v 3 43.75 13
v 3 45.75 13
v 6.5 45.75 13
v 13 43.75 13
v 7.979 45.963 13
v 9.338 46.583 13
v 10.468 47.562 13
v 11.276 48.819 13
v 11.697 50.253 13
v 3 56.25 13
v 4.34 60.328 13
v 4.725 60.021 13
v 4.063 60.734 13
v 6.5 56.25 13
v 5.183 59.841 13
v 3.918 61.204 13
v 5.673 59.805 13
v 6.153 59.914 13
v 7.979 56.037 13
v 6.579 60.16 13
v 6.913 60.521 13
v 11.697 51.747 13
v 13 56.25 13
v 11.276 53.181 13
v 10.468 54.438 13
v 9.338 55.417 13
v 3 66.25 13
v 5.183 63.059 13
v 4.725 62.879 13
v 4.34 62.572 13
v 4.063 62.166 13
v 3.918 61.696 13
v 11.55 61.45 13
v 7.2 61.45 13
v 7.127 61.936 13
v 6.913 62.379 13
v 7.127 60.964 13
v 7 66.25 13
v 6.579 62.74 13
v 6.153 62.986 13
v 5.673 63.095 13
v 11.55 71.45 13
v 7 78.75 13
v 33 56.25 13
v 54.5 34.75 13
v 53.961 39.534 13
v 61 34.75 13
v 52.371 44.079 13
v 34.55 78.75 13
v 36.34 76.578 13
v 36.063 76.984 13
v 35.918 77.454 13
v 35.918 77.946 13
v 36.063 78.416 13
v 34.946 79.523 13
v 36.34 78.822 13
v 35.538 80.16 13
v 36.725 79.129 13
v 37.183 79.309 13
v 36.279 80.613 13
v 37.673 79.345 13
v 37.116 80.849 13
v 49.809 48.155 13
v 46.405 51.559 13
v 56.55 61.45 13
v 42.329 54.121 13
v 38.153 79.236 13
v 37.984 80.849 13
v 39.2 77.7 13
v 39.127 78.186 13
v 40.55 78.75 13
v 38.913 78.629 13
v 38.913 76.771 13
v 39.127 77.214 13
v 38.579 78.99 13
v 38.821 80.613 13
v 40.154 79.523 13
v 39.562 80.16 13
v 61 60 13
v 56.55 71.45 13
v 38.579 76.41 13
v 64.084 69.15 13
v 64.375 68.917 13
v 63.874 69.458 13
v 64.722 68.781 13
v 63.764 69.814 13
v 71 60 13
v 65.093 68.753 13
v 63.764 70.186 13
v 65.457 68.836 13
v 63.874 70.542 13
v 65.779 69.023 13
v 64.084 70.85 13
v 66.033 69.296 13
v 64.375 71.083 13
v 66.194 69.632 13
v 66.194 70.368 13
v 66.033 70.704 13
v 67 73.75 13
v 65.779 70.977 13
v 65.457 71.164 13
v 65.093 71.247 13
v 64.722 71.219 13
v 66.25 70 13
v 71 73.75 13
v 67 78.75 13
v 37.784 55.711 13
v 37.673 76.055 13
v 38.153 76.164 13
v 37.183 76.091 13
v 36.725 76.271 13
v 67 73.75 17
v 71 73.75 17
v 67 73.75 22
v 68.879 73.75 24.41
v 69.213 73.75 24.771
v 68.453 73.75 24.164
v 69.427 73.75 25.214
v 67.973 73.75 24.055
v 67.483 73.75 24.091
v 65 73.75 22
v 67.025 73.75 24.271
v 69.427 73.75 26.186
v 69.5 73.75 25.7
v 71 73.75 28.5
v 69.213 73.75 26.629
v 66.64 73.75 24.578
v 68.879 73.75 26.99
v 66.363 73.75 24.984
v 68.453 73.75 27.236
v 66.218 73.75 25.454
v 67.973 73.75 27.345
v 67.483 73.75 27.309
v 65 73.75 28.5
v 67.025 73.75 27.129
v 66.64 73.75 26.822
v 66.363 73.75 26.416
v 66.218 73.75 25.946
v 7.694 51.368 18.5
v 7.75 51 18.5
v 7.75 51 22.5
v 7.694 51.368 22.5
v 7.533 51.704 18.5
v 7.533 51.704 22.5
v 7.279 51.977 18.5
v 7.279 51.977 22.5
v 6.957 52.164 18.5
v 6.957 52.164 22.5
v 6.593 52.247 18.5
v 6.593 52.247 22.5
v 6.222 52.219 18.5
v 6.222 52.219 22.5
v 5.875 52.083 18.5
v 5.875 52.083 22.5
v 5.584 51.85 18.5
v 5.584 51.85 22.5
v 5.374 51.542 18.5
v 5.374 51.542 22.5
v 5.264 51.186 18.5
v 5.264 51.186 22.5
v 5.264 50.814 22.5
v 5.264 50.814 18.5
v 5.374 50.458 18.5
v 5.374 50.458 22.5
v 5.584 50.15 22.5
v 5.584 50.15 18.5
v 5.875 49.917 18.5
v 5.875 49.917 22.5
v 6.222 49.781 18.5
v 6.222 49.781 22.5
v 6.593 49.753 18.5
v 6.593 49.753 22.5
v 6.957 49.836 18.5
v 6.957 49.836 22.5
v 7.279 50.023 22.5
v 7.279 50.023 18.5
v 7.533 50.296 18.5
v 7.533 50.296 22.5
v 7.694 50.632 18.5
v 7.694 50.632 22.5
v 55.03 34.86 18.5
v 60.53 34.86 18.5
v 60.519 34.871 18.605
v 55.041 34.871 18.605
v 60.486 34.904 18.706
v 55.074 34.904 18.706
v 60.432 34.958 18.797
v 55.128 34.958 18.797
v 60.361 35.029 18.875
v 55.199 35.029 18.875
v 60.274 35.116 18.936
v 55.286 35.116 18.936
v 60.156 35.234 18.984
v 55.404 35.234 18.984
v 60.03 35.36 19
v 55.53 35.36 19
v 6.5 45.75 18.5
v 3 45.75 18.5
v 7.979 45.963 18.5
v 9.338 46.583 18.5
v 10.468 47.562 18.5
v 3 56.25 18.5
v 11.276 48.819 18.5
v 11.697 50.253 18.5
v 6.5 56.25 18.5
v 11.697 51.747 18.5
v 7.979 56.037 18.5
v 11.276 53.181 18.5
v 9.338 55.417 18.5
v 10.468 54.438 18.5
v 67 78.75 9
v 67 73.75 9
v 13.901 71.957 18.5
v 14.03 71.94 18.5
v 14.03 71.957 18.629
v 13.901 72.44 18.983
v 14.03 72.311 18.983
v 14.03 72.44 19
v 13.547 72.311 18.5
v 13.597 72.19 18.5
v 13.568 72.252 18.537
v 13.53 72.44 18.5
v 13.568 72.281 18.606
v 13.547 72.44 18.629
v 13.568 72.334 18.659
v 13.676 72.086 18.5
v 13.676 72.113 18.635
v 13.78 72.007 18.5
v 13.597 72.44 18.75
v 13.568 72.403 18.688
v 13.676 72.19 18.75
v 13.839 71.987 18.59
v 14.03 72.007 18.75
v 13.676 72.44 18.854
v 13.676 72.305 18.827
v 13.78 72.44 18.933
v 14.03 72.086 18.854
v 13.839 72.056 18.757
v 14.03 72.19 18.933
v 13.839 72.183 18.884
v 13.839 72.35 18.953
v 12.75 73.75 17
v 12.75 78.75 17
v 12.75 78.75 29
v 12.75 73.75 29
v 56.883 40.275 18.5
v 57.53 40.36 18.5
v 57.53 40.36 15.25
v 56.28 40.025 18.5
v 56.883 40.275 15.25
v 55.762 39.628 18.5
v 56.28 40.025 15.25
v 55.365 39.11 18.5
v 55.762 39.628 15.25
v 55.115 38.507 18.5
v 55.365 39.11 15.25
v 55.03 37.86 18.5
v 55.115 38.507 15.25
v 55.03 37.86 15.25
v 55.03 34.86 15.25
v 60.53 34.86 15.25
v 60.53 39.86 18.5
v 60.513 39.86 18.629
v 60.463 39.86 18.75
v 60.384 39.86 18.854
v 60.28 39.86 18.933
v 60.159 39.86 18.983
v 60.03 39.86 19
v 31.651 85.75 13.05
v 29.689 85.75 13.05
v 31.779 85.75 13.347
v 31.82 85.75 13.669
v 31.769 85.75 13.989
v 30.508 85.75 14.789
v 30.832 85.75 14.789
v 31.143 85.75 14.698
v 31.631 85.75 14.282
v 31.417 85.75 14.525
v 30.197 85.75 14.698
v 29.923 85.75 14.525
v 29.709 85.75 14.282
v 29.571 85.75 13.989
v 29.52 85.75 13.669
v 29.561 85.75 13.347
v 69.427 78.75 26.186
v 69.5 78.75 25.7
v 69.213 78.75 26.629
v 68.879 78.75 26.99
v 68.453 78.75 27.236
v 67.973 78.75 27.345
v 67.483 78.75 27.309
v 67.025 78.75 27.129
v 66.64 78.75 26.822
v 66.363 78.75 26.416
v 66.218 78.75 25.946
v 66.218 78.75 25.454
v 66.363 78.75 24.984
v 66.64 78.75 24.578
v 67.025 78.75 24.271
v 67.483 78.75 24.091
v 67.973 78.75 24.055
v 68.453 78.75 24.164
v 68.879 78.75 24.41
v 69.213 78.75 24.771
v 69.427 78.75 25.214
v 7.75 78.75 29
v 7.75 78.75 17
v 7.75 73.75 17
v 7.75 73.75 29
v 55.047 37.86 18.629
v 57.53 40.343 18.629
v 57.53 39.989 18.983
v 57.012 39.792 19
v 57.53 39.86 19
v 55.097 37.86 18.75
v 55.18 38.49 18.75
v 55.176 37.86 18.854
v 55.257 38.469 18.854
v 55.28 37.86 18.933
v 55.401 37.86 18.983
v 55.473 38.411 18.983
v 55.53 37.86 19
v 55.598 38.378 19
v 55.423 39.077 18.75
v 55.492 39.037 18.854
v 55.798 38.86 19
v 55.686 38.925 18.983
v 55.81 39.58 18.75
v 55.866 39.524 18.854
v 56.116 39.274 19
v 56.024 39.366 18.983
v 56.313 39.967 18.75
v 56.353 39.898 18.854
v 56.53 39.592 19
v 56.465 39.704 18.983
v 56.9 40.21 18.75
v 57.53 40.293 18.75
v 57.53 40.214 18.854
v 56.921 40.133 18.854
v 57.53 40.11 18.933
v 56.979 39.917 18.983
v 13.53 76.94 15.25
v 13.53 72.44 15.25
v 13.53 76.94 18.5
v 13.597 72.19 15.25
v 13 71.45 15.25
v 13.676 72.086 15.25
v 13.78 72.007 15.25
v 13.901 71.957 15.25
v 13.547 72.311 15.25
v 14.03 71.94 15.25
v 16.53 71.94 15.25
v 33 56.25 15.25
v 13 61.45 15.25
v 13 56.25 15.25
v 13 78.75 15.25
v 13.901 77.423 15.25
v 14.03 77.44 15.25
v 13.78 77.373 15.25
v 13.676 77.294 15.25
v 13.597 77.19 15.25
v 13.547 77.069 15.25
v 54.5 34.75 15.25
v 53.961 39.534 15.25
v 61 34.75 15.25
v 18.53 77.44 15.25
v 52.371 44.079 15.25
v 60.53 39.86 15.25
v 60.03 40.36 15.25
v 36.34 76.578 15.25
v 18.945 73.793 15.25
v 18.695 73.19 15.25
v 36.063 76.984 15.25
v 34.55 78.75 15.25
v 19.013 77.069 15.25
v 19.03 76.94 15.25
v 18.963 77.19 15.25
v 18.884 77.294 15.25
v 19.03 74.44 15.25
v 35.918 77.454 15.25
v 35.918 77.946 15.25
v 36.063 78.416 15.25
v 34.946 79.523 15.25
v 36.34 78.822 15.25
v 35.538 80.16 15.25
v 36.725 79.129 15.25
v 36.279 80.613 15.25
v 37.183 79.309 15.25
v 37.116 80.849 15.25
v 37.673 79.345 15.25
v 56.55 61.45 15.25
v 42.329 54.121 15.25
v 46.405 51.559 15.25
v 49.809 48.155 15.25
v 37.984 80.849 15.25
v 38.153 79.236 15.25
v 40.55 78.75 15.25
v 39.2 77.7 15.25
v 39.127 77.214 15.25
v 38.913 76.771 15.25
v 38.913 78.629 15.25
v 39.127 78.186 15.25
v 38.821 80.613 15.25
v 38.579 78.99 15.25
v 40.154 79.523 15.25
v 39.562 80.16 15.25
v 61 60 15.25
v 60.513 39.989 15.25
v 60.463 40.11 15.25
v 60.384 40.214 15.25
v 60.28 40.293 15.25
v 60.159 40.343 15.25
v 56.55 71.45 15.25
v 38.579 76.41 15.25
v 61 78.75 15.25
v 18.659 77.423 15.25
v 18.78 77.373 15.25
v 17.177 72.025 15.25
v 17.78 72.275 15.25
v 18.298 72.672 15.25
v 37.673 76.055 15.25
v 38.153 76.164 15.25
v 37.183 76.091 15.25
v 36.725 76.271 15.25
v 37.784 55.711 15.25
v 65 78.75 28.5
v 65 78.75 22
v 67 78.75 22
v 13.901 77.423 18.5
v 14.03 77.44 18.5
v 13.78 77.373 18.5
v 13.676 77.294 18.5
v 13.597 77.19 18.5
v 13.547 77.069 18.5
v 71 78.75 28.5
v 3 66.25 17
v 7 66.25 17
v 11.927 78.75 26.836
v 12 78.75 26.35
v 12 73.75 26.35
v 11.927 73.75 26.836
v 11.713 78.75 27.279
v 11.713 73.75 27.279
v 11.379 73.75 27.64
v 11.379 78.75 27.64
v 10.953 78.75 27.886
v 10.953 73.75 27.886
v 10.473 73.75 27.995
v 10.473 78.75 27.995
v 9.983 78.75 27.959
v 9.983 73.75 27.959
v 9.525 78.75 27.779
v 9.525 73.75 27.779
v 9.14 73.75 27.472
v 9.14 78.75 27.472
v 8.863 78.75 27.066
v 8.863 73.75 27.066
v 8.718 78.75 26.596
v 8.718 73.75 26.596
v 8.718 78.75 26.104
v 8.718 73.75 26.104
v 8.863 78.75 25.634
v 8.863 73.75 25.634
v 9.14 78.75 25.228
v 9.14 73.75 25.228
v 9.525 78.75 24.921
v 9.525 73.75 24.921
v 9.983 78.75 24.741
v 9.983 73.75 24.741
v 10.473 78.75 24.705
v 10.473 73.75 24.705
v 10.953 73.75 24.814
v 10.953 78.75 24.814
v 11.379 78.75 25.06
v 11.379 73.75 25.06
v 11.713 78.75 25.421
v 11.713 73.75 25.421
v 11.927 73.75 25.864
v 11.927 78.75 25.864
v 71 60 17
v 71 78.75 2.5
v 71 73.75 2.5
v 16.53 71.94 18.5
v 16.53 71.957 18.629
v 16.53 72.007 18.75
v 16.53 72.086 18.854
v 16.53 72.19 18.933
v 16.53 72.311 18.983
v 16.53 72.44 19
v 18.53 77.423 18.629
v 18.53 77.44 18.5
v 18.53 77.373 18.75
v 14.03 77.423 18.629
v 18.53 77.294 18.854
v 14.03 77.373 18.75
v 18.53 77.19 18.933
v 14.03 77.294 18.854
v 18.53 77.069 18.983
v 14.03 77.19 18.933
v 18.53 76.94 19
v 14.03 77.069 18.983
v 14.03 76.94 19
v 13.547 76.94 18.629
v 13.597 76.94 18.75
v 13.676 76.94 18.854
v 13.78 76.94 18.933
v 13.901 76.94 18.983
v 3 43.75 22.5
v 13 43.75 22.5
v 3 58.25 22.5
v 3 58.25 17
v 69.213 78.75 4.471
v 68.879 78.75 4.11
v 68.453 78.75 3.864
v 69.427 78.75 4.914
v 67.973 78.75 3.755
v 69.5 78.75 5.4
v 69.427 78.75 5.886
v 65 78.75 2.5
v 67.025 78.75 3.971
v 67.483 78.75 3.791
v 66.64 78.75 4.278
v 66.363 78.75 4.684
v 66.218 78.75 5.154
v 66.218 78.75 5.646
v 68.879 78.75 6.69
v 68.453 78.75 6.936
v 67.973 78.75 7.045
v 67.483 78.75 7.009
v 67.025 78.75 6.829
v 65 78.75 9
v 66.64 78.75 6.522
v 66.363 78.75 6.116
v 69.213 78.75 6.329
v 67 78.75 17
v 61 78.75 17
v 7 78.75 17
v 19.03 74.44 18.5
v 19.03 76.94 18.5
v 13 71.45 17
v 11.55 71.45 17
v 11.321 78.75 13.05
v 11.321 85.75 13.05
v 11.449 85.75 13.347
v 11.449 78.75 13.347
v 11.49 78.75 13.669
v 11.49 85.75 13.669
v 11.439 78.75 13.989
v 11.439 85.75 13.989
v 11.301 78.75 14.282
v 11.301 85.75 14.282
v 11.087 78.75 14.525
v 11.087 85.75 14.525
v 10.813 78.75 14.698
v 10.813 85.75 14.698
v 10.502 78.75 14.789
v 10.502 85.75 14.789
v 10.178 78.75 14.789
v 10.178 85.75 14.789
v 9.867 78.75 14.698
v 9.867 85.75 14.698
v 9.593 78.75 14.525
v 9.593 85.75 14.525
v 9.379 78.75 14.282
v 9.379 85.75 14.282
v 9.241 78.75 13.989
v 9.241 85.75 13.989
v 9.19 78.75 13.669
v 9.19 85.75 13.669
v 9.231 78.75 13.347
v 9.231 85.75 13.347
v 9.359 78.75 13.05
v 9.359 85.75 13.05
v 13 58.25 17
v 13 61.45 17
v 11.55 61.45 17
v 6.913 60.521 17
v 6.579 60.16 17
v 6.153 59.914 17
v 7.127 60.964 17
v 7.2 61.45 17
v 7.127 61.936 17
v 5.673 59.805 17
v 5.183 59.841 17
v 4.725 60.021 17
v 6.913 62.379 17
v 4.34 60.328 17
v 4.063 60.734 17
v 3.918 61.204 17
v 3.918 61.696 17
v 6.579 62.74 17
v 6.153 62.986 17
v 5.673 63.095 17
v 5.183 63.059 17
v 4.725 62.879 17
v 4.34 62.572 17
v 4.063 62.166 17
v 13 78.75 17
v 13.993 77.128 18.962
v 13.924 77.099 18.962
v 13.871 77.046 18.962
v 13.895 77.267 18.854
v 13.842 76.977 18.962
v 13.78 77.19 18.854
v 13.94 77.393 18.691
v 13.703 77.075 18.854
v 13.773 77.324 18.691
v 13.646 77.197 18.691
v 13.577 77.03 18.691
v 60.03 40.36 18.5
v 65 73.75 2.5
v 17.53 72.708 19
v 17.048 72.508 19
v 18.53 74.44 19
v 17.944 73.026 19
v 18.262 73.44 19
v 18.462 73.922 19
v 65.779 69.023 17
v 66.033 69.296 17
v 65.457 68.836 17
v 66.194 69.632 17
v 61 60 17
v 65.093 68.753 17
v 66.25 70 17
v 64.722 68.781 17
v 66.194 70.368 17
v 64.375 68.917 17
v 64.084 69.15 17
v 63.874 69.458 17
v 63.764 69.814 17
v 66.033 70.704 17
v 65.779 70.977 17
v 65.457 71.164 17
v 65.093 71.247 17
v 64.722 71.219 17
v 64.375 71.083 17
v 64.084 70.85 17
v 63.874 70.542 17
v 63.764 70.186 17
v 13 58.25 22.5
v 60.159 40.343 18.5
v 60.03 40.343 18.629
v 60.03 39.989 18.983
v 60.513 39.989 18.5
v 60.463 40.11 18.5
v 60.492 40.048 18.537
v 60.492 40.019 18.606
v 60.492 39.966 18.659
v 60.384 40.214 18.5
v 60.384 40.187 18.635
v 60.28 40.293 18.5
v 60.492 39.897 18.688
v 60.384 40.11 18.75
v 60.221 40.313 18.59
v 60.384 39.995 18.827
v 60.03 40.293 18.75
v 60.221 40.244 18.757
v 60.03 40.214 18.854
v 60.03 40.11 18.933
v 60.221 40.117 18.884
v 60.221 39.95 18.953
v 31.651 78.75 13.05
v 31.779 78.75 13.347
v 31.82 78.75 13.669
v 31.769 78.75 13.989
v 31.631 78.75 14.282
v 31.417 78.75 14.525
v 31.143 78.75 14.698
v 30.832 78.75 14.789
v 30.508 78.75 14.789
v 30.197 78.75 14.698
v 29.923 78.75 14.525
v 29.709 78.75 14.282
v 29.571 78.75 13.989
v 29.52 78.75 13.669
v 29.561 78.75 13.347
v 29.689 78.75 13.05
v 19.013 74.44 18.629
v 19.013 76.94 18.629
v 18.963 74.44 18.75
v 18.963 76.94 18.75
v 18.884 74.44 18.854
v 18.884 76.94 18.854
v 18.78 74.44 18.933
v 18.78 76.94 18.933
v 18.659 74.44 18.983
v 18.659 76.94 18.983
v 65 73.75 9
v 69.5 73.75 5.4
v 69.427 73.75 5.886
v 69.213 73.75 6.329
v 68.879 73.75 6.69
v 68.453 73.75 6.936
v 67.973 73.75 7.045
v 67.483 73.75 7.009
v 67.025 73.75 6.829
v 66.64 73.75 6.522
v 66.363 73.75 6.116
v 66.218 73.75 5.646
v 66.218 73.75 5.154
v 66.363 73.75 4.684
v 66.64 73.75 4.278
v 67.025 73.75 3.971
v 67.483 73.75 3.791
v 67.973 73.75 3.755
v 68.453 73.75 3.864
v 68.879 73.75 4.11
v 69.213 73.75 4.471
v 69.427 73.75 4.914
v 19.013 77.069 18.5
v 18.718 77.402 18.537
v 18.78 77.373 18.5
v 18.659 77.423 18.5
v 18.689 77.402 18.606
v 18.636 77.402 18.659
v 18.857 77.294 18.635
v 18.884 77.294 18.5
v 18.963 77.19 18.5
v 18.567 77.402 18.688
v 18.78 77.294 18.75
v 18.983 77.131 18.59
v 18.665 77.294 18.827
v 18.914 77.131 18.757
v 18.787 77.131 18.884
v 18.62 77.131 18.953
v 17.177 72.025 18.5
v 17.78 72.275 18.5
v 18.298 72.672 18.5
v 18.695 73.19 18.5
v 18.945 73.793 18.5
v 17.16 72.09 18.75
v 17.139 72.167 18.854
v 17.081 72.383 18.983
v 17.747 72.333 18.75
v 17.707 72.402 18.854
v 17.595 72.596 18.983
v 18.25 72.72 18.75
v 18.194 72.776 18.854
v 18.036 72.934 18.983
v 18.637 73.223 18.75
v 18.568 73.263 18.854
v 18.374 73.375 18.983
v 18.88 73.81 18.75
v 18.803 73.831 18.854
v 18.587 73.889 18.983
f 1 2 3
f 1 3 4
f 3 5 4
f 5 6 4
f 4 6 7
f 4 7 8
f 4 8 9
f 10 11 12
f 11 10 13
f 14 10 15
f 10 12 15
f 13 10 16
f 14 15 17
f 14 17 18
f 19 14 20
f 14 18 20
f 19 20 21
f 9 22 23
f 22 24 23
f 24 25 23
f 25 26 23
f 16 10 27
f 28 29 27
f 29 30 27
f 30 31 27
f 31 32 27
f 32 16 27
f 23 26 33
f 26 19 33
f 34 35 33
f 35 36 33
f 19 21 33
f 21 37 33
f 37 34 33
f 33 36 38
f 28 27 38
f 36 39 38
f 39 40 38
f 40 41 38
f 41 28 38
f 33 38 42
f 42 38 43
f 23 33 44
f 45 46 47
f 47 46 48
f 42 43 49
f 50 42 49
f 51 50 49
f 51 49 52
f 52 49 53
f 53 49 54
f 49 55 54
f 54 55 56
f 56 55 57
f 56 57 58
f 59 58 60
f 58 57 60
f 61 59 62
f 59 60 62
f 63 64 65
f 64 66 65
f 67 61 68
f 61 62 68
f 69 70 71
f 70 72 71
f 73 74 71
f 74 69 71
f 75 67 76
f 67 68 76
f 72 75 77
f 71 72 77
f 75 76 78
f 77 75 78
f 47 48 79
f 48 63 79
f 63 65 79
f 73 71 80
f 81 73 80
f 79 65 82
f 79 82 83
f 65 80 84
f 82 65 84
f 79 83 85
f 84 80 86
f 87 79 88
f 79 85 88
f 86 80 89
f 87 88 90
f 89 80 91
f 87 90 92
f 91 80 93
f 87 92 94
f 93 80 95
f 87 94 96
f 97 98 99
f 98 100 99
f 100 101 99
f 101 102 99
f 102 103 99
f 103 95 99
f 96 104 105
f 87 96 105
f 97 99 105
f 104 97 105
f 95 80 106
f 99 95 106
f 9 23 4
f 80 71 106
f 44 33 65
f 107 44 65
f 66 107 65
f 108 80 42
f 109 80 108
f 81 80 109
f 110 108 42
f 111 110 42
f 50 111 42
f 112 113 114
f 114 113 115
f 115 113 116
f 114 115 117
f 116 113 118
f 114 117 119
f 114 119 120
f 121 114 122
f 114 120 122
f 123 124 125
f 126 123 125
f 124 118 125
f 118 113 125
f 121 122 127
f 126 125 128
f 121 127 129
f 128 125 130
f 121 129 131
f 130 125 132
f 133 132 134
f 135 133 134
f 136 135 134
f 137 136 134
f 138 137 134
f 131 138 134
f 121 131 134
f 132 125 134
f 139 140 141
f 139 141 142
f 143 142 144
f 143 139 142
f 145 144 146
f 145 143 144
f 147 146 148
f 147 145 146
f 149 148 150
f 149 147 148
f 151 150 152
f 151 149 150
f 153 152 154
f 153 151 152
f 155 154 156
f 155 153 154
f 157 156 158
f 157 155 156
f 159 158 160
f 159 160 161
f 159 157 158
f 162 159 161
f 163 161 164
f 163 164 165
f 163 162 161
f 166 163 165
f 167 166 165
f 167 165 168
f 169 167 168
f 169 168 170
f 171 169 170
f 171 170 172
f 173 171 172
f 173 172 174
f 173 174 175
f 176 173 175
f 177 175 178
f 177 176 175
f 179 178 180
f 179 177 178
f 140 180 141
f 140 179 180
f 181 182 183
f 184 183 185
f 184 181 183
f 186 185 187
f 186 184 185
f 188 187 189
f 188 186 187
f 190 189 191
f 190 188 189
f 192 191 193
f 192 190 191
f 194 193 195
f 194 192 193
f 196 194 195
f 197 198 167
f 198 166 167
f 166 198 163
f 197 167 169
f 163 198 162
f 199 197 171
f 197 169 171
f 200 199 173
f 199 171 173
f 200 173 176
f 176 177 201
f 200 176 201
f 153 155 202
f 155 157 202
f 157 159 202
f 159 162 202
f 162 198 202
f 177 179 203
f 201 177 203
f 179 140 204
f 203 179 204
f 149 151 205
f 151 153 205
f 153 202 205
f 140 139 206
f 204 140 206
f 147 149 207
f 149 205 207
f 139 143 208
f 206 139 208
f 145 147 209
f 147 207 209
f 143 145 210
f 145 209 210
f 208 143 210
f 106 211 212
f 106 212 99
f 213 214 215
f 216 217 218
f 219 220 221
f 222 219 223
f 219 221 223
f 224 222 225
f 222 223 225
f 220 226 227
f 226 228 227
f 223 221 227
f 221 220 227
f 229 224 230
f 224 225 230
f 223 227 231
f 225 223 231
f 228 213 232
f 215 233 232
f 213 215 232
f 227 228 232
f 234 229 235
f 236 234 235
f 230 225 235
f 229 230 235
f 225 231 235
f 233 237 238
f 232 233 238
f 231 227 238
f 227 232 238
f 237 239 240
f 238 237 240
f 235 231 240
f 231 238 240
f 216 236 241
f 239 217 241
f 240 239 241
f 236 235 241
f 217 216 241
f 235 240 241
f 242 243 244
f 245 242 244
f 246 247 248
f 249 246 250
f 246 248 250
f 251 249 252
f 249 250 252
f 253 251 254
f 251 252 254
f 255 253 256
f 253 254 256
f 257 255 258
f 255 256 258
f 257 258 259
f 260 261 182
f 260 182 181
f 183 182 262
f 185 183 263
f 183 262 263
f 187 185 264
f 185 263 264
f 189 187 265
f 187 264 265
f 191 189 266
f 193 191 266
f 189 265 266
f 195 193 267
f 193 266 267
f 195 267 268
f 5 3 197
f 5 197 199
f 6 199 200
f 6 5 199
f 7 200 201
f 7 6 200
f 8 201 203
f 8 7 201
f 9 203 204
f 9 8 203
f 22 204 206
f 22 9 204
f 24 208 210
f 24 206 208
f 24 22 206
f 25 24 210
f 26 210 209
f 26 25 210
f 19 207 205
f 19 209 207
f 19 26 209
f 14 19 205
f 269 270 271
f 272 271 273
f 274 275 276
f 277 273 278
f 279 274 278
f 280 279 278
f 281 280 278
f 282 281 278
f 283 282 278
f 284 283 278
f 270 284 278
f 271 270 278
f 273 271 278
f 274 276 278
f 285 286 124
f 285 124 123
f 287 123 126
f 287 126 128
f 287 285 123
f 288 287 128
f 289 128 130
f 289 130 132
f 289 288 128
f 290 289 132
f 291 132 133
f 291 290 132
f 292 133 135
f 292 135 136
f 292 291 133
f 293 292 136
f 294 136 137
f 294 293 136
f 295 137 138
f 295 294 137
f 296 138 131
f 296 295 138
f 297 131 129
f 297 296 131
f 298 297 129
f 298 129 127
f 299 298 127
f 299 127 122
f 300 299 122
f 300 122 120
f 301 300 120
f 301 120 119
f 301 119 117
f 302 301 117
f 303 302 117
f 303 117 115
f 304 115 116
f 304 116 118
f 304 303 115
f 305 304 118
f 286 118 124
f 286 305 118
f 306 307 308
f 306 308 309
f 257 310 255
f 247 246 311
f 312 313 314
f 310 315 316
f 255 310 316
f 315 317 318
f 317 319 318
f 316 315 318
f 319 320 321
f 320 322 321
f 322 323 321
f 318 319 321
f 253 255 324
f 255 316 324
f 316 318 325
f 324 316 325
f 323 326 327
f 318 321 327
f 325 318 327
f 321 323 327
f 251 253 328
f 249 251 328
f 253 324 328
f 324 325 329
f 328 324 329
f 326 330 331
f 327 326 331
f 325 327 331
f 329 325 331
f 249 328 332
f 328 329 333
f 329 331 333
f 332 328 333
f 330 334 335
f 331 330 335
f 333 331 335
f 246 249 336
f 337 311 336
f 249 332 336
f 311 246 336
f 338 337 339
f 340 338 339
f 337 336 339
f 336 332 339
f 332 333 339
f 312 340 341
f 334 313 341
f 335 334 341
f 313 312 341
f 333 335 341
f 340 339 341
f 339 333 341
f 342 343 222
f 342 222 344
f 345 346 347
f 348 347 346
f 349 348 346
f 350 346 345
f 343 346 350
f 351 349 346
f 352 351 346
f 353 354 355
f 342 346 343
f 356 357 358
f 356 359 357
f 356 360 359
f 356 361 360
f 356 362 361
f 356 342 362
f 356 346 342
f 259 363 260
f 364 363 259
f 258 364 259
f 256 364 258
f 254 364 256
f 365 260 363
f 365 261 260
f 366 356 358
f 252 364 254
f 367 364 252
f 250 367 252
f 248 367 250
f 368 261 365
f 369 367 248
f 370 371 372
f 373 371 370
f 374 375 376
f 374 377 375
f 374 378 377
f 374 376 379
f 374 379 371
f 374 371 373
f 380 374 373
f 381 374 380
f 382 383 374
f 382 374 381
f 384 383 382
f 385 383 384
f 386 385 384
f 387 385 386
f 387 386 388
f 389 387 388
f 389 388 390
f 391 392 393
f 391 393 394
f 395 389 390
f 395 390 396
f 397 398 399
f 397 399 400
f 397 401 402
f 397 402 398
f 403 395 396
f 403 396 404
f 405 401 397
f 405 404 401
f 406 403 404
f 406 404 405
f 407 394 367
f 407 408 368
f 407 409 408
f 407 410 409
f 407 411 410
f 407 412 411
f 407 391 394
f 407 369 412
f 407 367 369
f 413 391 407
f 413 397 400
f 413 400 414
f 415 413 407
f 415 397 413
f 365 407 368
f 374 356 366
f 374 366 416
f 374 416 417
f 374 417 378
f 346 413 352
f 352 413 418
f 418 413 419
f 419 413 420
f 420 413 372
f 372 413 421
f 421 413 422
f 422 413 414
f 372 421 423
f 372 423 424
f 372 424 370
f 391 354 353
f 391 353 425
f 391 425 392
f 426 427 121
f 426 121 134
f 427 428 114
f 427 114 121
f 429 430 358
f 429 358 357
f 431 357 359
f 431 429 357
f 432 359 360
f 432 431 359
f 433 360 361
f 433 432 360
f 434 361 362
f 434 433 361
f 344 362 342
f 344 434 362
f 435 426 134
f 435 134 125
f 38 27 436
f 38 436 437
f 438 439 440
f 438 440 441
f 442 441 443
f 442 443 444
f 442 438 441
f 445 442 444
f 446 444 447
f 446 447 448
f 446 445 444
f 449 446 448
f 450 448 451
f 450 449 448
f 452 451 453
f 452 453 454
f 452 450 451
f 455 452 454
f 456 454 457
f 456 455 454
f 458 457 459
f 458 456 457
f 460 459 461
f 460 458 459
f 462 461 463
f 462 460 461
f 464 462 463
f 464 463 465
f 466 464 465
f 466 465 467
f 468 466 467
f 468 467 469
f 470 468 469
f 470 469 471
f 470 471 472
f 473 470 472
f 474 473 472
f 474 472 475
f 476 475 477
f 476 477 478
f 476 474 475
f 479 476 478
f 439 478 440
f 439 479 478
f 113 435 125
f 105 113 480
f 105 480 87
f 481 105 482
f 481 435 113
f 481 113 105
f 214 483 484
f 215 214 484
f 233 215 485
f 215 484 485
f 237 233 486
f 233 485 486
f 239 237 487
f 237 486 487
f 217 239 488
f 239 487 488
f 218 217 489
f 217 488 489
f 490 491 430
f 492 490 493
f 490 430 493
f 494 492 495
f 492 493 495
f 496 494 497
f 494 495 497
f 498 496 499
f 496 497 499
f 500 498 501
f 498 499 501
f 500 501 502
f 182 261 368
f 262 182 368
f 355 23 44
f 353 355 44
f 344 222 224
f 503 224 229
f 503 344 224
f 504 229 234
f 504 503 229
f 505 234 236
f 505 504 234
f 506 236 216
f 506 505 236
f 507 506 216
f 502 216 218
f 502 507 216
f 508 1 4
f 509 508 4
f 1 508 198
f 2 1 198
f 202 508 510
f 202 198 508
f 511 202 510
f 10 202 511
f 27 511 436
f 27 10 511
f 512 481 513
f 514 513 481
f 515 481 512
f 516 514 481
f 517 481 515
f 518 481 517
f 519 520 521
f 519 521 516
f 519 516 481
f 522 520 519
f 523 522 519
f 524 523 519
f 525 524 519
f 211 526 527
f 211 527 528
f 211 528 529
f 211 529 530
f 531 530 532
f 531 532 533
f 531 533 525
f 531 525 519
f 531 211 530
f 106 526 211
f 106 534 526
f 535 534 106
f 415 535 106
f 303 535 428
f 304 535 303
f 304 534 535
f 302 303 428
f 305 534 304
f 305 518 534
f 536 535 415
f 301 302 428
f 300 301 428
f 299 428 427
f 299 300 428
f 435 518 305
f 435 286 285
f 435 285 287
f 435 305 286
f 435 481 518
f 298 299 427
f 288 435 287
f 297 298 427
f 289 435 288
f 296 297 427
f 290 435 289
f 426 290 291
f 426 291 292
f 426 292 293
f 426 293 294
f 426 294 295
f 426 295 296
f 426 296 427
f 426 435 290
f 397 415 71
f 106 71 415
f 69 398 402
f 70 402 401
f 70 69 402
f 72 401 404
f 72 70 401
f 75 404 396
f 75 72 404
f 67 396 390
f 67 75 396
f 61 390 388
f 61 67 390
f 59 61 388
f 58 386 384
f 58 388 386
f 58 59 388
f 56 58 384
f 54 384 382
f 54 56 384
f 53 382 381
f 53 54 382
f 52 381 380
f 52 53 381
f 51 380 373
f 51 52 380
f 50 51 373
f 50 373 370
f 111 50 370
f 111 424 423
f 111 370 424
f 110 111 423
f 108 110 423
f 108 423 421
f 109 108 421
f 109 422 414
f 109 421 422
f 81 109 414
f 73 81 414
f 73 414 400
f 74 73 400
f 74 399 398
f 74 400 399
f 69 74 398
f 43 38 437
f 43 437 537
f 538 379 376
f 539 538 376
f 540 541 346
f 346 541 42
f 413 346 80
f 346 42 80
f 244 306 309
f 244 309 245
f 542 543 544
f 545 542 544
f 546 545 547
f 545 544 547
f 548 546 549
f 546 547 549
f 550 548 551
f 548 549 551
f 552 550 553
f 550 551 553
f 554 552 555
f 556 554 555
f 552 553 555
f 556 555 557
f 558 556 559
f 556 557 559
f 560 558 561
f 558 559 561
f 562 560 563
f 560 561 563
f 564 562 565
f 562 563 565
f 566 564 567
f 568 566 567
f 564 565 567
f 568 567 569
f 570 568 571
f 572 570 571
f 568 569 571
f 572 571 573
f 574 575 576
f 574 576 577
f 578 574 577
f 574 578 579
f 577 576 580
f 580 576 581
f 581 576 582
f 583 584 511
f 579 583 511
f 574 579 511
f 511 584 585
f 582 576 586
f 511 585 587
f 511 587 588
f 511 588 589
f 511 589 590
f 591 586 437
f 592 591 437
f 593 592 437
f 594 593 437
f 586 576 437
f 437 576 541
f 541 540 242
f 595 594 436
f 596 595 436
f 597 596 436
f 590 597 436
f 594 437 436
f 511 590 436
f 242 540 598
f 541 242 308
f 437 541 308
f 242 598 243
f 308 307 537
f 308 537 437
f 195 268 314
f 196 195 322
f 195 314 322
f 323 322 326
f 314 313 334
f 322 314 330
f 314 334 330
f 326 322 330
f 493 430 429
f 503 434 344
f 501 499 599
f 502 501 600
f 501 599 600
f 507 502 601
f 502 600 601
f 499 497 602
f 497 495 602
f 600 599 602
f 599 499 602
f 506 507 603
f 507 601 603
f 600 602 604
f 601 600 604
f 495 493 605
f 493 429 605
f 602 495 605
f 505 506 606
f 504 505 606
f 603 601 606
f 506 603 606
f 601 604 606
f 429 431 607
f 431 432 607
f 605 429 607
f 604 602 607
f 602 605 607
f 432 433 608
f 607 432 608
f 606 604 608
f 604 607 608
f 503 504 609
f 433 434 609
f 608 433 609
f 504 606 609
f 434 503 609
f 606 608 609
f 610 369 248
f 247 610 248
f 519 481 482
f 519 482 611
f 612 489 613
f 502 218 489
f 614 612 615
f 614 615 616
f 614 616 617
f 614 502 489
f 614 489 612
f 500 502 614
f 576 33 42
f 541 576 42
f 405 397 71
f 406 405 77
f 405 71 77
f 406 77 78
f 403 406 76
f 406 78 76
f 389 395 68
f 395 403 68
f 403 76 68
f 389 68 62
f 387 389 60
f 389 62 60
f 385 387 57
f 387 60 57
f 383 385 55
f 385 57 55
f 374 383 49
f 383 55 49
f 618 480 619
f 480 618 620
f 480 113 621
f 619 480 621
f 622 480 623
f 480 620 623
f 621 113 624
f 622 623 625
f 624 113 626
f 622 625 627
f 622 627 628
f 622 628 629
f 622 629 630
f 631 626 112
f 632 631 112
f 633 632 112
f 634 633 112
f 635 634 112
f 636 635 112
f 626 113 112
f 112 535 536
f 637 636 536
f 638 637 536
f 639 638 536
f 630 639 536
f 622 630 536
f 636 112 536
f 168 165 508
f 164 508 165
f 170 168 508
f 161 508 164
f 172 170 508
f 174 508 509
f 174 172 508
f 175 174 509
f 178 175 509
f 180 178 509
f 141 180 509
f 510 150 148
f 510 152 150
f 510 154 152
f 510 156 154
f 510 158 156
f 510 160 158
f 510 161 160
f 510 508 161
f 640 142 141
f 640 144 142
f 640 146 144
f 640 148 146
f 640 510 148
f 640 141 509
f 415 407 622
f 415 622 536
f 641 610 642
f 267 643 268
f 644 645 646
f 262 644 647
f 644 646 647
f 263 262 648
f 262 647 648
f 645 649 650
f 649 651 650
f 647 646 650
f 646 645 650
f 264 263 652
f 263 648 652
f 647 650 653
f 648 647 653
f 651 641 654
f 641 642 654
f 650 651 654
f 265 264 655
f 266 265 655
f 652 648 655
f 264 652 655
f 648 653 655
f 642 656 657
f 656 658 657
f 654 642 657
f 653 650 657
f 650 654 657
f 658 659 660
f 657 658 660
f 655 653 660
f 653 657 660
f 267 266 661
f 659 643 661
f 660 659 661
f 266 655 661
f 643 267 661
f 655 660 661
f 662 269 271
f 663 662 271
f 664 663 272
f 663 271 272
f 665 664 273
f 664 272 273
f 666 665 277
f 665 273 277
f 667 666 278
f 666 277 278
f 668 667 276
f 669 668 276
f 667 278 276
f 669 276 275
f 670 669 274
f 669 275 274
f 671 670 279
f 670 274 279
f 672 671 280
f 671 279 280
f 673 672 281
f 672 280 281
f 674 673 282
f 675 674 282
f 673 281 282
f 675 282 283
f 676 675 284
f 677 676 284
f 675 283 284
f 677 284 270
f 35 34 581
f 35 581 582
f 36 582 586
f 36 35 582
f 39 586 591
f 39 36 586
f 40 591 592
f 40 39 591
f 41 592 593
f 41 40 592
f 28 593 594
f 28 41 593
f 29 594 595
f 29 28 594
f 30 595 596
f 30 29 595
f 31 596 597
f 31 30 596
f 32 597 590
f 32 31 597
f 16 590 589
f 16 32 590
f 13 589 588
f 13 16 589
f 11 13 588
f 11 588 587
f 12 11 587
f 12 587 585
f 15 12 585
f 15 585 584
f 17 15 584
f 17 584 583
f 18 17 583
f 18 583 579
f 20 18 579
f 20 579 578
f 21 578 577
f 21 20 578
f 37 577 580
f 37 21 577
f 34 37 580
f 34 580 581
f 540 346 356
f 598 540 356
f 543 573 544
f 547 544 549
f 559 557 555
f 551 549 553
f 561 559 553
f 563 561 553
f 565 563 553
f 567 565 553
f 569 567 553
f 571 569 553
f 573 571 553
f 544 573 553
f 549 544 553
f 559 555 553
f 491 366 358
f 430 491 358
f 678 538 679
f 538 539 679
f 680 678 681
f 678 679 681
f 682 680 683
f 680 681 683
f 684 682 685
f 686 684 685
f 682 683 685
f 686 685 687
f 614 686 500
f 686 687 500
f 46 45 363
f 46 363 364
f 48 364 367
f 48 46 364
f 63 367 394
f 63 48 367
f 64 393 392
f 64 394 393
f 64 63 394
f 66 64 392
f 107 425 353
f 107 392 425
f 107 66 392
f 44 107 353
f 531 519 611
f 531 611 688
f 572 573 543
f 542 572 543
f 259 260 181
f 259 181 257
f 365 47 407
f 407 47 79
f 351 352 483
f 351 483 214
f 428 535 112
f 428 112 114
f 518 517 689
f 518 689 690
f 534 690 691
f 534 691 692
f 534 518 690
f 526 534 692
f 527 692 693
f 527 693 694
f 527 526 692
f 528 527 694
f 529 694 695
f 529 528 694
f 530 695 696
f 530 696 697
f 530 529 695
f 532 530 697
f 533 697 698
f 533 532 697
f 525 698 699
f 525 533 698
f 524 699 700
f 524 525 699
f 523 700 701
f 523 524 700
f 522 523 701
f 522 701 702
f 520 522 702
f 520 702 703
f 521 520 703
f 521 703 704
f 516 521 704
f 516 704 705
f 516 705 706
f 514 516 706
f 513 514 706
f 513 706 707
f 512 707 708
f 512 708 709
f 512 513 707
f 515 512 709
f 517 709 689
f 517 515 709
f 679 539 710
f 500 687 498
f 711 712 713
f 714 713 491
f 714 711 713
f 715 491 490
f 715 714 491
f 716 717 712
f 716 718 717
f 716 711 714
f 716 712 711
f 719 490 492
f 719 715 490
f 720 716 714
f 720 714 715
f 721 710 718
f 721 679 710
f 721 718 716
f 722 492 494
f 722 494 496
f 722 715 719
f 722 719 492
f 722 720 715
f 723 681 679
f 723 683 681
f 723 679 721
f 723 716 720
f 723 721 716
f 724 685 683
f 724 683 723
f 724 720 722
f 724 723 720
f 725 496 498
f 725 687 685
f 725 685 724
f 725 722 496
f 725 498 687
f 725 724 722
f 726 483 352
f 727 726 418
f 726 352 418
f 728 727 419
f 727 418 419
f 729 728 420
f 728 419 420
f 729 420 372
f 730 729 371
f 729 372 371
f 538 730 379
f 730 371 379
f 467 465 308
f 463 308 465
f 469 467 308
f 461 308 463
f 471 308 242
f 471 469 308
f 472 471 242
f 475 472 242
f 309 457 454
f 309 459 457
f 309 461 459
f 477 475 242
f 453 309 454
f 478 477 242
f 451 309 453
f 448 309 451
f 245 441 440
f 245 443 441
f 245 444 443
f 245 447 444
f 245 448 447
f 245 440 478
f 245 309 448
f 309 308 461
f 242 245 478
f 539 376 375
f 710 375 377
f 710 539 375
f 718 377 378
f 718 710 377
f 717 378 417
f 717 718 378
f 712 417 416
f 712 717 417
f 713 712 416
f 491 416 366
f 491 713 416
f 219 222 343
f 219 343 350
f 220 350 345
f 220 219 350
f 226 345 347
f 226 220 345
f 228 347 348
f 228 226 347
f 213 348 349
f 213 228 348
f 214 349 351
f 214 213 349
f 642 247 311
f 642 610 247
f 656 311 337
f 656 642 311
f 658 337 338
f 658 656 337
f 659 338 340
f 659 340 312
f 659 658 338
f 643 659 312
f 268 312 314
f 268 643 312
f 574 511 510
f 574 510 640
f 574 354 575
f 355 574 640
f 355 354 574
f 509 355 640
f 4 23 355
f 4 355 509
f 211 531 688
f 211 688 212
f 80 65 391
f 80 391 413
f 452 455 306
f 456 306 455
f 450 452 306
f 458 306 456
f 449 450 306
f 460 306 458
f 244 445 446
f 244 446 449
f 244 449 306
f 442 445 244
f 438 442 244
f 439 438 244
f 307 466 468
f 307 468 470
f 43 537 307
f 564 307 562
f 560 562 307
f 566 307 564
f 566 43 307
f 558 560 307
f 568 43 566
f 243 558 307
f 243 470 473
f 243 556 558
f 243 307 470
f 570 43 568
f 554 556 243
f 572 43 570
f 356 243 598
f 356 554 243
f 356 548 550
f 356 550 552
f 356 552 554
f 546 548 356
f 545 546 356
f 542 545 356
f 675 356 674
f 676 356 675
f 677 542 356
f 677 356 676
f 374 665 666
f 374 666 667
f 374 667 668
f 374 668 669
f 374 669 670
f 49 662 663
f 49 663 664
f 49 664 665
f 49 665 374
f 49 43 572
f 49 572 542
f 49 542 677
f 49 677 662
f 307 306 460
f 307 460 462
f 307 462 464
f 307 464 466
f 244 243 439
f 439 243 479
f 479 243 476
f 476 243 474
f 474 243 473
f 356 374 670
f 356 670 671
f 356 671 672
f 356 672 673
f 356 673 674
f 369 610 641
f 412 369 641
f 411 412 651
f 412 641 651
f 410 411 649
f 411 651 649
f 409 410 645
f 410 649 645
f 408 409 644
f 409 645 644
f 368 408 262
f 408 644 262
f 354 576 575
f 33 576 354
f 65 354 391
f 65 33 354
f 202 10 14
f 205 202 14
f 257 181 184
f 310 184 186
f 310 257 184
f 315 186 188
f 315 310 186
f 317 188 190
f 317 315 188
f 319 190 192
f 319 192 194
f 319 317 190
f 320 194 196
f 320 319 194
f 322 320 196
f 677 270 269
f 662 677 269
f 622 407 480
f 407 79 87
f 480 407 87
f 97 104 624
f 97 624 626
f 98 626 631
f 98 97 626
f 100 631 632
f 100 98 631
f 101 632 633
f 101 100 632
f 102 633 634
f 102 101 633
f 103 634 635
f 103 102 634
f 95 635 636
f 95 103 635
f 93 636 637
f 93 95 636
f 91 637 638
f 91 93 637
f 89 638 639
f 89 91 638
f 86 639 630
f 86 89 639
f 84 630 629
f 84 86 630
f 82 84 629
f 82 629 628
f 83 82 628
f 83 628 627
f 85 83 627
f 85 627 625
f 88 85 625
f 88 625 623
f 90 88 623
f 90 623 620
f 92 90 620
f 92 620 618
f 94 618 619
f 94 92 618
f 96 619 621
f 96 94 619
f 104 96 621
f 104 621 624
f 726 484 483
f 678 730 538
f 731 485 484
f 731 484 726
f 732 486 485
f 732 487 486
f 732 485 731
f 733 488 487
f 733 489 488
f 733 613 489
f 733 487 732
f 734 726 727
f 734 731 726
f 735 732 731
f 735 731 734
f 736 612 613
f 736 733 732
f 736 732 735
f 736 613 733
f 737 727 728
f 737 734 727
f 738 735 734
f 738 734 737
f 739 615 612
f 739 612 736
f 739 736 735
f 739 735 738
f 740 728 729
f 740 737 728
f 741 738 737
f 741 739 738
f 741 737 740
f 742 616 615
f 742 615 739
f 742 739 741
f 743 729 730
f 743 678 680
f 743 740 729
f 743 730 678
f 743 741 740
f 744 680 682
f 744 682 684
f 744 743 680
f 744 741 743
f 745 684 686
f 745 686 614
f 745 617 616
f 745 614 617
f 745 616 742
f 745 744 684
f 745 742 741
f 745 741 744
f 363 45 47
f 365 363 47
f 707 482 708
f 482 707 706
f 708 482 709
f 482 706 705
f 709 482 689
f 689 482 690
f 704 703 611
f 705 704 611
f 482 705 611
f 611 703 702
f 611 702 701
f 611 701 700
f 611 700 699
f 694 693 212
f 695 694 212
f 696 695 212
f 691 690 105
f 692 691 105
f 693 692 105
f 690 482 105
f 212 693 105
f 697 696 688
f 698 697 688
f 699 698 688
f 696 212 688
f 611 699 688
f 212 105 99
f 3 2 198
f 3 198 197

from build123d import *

# Parameters (mm, degrees)
SKETCH021_R      = 1.65
EXTRUDE021_DEPTH = 5
EXTRUDE001_DEPTH = 4
FILLET003_R      = 0.5
BOX005_W         = 48
BOX005_H         = 47
BOX005_DEPTH     = 10
EXTRUDE037_DEPTH = 6
SKETCH038_W      = 10
SKETCH038_H      = 14.5
SKETCH038_R      = 1.25
EXTRUDE038_DEPTH = 4
SKETCH039_W      = 5
SKETCH039_H      = 16
SKETCH039_R      = 1.65
EXTRUDE039_DEPTH = 5
EXTRUDE040_DEPTH = 7
SKETCH020_R      = 1.65
SKETCH020_R_2    = 1.25
SKETCH020_W      = 45
SKETCH020_H      = 10
EXTRUDE036_DEPTH = 4


with BuildPart() as gpshold:
    # Sketch021 → Extrude021 (new body)
    with BuildSketch(Plane.XZ):
        Polygon((65, 28.5), (71, 28.5), (71, 2.5), (65, 2.5), (65, 9), (67, 9), (67, 22), (65, 22), align=None)
        with Locations((67.85, 25.7)):
            Circle(SKETCH021_R, mode=Mode.SUBTRACT)
        with Locations((67.85, 5.4)):
            Circle(SKETCH021_R, mode=Mode.SUBTRACT)
    extrude(amount=EXTRUDE021_DEPTH)


with BuildPart() as gpshold_1:
    # Extrude021 placement: moved
    add(gpshold.part.moved(Location((0, 78.75, 0))))


with BuildPart() as ipsholdbottomindone:
    # Sketch001 → Extrude001 (new body)
    with BuildSketch(Plane.XY):
        with BuildLine():
            Line((19.03, 74.44), (19.03, 77.44))
            Line((19.03, 77.44), (13.53, 77.44))
            Line((13.53, 71.94), (13.53, 77.44))
            Line((16.53, 71.94), (13.53, 71.94))
            ThreePointArc((16.53, 71.94), (18.297767, 72.672233), (19.03, 74.44))
        make_face()
        with BuildLine():
            Line((60.53, 34.86), (55.03, 34.86))
            Line((55.03, 34.86), (55.03, 37.86))
            ThreePointArc((57.53, 40.36), (55.762233, 39.627767), (55.03, 37.86))
            Line((60.53, 40.36), (57.53, 40.36))
            Line((60.53, 34.86), (60.53, 40.36))
        make_face()
    extrude(amount=EXTRUDE001_DEPTH)


with BuildPart() as ipsholdbottomindone_1:
    # Extrude001 placement: moved
    add(ipsholdbottomindone.part.moved(Location((0, 0, 2))))

    # Fillet003
    fillet003_edges = [ipsholdbottomindone_1.edges().sort_by_distance(p)[0] for p in [
        (57.78, 34.86, 6),
        (55.03, 36.36, 6),
        (55.762233, 39.627767, 6),
        (60.53, 40.36, 4),
        (59.03, 40.36, 6),
        (60.53, 37.61, 6),
        (18.297767, 72.672233, 6),
        (19.03, 77.44, 4),
        (19.03, 75.94, 6),
        (13.53, 77.44, 4),
        (16.28, 77.44, 6),
        (13.53, 71.94, 4),
        (13.53, 74.69, 6),
        (15.03, 71.94, 6),
    ]]
    fillet(fillet003_edges, radius=FILLET003_R)


with BuildPart() as ipsholdbottomindone_2:
    # Fillet003 placement: moved
    add(ipsholdbottomindone_1.part.moved(Location((0, 0, 13))))


with BuildPart() as sensorholdipscut:
    # Box005 → Box005 (new body)
    with BuildSketch(Plane(origin=(13, 34, 15.25), x_dir=(1, 0, 0), z_dir=(0, 0, 1))):
        with Locations((24, 23.5)):
            Rectangle(BOX005_W, BOX005_H)
    extrude(amount=BOX005_DEPTH)


with BuildPart() as sensorholdaddon:
    # Sketch037 → Extrude037 (new body)
    with BuildSketch(Plane.XY.offset(17)):
        with BuildLine():
            Line((3, 58.25), (13, 58.25))
            Line((13, 58.25), (13, 43.75))
            Line((13, 43.75), (3, 43.75))
            Line((3, 43.75), (3, 45.75))
            Line((3, 45.75), (6.5, 45.75))
            ThreePointArc((6.5, 45.75), (11.75, 51), (6.5, 56.25))
            Line((3, 56.25), (6.5, 56.25))
            Line((3, 58.25), (3, 56.25))
        make_face()
    extrude(amount=EXTRUDE037_DEPTH)


with BuildPart() as sensorholdaddon_1:
    # Extrude037 placement: moved
    add(sensorholdaddon.part.moved(Location((0, 0, -4))))


with BuildPart() as sensorholdaddon001:
    # Sketch038 → Extrude038 (new body)
    with BuildSketch(Plane.XY.offset(17)):
        with Locations((8, 51)):
            Rectangle(SKETCH038_W, SKETCH038_H)
        with Locations((6.5, 51)):
            Circle(SKETCH038_R, mode=Mode.SUBTRACT)
    extrude(amount=EXTRUDE038_DEPTH)


with BuildPart() as sensorholdaddon001_1:
    # Extrude038 placement: moved
    add(sensorholdaddon001.part.moved(Location((0, 0, 1.5))))


with BuildPart() as bmehold:
    # Sketch039 → Extrude039 (new body)
    with BuildSketch(Plane.XZ.offset(-78.75)):
        with Locations((10.25, 21)):
            Rectangle(SKETCH039_W, SKETCH039_H)
        with Locations((10.35, 26.35)):
            Circle(SKETCH039_R, mode=Mode.SUBTRACT)
    extrude(amount=EXTRUDE039_DEPTH)


with BuildPart() as bmehold001:
    # Sketch040 → Extrude040 (new body)
    with BuildSketch(Plane.XZ.offset(-78.75)):
        with BuildLine():
            ThreePointArc((11.321071, 13.05), (10.34, 14.8), (9.358929, 13.05))
            Line((9.358929, 13.05), (11.321071, 13.05))
        make_face()
        with BuildLine():
            ThreePointArc((31.651071, 13.05), (30.67, 14.8), (29.688929, 13.05))
            Line((29.688929, 13.05), (31.651071, 13.05))
        make_face()
    extrude(amount=EXTRUDE040_DEPTH)


with BuildPart() as bmehold001_1:
    # Extrude040 placement: moved
    add(bmehold001.part.moved(Location((0, 7, 0))))


with BuildPart() as sensorhold005:
    # Sketch020 → Extrude036 (new body)
    with BuildSketch(Plane.XY):
        with BuildLine():
            Line((71, 78.75), (71, 60))
            Line((61, 60), (71, 60))
            Line((61, 34.75), (61, 60))
            Line((61, 34.75), (61, 60))
            Line((61, 34.75), (61, 60))
            Line((54.5, 34.75), (61, 34.75))
            ThreePointArc((54.5, 34.75), (48.202796, 49.952796), (33, 56.25))
            Line((3, 56.25), (33, 56.25))
            Line((3, 56.25), (3, 66.25))
            Line((3, 66.25), (7, 66.25))
            Line((7, 66.25), (7, 78.75))
            Line((7, 78.75), (34.55, 78.75))
            ThreePointArc((40.55, 78.75), (37.55, 80.878443), (34.55, 78.75))
            Line((40.55, 78.75), (71, 78.75))
        make_face()
        with Locations((5.55, 61.45)):
            Circle(SKETCH020_R, mode=Mode.SUBTRACT)
        with Locations((37.55, 77.7)):
            Circle(SKETCH020_R, mode=Mode.SUBTRACT)
        with Locations((65, 70)):
            Circle(SKETCH020_R_2, mode=Mode.SUBTRACT)
        with Locations((34.05, 66.45)):
            Rectangle(SKETCH020_W, SKETCH020_H, mode=Mode.SUBTRACT)
    extrude(amount=EXTRUDE036_DEPTH)


with BuildPart() as sensorhold005_1:
    # Extrude036 placement: moved
    add(sensorhold005.part.moved(Location((0, 0, 13))))

    # Fusion034: union sensorHoldAddon, sensorHoldAddon001, bmeHold, bmeHold001
    add(sensorholdaddon_1.part)
    add(sensorholdaddon001_1.part)
    add(bmehold.part)
    add(bmehold001_1.part)

    # Cut016: cut sensorHoldIPSCut
    add(sensorholdipscut.part, mode=Mode.SUBTRACT)

    # Fusion035: union ipsHoldBottomInDone
    add(ipsholdbottomindone_2.part)

    # Fusion036: union gpsHold
    add(gpshold_1.part)


solid = sensorhold005_1.part
